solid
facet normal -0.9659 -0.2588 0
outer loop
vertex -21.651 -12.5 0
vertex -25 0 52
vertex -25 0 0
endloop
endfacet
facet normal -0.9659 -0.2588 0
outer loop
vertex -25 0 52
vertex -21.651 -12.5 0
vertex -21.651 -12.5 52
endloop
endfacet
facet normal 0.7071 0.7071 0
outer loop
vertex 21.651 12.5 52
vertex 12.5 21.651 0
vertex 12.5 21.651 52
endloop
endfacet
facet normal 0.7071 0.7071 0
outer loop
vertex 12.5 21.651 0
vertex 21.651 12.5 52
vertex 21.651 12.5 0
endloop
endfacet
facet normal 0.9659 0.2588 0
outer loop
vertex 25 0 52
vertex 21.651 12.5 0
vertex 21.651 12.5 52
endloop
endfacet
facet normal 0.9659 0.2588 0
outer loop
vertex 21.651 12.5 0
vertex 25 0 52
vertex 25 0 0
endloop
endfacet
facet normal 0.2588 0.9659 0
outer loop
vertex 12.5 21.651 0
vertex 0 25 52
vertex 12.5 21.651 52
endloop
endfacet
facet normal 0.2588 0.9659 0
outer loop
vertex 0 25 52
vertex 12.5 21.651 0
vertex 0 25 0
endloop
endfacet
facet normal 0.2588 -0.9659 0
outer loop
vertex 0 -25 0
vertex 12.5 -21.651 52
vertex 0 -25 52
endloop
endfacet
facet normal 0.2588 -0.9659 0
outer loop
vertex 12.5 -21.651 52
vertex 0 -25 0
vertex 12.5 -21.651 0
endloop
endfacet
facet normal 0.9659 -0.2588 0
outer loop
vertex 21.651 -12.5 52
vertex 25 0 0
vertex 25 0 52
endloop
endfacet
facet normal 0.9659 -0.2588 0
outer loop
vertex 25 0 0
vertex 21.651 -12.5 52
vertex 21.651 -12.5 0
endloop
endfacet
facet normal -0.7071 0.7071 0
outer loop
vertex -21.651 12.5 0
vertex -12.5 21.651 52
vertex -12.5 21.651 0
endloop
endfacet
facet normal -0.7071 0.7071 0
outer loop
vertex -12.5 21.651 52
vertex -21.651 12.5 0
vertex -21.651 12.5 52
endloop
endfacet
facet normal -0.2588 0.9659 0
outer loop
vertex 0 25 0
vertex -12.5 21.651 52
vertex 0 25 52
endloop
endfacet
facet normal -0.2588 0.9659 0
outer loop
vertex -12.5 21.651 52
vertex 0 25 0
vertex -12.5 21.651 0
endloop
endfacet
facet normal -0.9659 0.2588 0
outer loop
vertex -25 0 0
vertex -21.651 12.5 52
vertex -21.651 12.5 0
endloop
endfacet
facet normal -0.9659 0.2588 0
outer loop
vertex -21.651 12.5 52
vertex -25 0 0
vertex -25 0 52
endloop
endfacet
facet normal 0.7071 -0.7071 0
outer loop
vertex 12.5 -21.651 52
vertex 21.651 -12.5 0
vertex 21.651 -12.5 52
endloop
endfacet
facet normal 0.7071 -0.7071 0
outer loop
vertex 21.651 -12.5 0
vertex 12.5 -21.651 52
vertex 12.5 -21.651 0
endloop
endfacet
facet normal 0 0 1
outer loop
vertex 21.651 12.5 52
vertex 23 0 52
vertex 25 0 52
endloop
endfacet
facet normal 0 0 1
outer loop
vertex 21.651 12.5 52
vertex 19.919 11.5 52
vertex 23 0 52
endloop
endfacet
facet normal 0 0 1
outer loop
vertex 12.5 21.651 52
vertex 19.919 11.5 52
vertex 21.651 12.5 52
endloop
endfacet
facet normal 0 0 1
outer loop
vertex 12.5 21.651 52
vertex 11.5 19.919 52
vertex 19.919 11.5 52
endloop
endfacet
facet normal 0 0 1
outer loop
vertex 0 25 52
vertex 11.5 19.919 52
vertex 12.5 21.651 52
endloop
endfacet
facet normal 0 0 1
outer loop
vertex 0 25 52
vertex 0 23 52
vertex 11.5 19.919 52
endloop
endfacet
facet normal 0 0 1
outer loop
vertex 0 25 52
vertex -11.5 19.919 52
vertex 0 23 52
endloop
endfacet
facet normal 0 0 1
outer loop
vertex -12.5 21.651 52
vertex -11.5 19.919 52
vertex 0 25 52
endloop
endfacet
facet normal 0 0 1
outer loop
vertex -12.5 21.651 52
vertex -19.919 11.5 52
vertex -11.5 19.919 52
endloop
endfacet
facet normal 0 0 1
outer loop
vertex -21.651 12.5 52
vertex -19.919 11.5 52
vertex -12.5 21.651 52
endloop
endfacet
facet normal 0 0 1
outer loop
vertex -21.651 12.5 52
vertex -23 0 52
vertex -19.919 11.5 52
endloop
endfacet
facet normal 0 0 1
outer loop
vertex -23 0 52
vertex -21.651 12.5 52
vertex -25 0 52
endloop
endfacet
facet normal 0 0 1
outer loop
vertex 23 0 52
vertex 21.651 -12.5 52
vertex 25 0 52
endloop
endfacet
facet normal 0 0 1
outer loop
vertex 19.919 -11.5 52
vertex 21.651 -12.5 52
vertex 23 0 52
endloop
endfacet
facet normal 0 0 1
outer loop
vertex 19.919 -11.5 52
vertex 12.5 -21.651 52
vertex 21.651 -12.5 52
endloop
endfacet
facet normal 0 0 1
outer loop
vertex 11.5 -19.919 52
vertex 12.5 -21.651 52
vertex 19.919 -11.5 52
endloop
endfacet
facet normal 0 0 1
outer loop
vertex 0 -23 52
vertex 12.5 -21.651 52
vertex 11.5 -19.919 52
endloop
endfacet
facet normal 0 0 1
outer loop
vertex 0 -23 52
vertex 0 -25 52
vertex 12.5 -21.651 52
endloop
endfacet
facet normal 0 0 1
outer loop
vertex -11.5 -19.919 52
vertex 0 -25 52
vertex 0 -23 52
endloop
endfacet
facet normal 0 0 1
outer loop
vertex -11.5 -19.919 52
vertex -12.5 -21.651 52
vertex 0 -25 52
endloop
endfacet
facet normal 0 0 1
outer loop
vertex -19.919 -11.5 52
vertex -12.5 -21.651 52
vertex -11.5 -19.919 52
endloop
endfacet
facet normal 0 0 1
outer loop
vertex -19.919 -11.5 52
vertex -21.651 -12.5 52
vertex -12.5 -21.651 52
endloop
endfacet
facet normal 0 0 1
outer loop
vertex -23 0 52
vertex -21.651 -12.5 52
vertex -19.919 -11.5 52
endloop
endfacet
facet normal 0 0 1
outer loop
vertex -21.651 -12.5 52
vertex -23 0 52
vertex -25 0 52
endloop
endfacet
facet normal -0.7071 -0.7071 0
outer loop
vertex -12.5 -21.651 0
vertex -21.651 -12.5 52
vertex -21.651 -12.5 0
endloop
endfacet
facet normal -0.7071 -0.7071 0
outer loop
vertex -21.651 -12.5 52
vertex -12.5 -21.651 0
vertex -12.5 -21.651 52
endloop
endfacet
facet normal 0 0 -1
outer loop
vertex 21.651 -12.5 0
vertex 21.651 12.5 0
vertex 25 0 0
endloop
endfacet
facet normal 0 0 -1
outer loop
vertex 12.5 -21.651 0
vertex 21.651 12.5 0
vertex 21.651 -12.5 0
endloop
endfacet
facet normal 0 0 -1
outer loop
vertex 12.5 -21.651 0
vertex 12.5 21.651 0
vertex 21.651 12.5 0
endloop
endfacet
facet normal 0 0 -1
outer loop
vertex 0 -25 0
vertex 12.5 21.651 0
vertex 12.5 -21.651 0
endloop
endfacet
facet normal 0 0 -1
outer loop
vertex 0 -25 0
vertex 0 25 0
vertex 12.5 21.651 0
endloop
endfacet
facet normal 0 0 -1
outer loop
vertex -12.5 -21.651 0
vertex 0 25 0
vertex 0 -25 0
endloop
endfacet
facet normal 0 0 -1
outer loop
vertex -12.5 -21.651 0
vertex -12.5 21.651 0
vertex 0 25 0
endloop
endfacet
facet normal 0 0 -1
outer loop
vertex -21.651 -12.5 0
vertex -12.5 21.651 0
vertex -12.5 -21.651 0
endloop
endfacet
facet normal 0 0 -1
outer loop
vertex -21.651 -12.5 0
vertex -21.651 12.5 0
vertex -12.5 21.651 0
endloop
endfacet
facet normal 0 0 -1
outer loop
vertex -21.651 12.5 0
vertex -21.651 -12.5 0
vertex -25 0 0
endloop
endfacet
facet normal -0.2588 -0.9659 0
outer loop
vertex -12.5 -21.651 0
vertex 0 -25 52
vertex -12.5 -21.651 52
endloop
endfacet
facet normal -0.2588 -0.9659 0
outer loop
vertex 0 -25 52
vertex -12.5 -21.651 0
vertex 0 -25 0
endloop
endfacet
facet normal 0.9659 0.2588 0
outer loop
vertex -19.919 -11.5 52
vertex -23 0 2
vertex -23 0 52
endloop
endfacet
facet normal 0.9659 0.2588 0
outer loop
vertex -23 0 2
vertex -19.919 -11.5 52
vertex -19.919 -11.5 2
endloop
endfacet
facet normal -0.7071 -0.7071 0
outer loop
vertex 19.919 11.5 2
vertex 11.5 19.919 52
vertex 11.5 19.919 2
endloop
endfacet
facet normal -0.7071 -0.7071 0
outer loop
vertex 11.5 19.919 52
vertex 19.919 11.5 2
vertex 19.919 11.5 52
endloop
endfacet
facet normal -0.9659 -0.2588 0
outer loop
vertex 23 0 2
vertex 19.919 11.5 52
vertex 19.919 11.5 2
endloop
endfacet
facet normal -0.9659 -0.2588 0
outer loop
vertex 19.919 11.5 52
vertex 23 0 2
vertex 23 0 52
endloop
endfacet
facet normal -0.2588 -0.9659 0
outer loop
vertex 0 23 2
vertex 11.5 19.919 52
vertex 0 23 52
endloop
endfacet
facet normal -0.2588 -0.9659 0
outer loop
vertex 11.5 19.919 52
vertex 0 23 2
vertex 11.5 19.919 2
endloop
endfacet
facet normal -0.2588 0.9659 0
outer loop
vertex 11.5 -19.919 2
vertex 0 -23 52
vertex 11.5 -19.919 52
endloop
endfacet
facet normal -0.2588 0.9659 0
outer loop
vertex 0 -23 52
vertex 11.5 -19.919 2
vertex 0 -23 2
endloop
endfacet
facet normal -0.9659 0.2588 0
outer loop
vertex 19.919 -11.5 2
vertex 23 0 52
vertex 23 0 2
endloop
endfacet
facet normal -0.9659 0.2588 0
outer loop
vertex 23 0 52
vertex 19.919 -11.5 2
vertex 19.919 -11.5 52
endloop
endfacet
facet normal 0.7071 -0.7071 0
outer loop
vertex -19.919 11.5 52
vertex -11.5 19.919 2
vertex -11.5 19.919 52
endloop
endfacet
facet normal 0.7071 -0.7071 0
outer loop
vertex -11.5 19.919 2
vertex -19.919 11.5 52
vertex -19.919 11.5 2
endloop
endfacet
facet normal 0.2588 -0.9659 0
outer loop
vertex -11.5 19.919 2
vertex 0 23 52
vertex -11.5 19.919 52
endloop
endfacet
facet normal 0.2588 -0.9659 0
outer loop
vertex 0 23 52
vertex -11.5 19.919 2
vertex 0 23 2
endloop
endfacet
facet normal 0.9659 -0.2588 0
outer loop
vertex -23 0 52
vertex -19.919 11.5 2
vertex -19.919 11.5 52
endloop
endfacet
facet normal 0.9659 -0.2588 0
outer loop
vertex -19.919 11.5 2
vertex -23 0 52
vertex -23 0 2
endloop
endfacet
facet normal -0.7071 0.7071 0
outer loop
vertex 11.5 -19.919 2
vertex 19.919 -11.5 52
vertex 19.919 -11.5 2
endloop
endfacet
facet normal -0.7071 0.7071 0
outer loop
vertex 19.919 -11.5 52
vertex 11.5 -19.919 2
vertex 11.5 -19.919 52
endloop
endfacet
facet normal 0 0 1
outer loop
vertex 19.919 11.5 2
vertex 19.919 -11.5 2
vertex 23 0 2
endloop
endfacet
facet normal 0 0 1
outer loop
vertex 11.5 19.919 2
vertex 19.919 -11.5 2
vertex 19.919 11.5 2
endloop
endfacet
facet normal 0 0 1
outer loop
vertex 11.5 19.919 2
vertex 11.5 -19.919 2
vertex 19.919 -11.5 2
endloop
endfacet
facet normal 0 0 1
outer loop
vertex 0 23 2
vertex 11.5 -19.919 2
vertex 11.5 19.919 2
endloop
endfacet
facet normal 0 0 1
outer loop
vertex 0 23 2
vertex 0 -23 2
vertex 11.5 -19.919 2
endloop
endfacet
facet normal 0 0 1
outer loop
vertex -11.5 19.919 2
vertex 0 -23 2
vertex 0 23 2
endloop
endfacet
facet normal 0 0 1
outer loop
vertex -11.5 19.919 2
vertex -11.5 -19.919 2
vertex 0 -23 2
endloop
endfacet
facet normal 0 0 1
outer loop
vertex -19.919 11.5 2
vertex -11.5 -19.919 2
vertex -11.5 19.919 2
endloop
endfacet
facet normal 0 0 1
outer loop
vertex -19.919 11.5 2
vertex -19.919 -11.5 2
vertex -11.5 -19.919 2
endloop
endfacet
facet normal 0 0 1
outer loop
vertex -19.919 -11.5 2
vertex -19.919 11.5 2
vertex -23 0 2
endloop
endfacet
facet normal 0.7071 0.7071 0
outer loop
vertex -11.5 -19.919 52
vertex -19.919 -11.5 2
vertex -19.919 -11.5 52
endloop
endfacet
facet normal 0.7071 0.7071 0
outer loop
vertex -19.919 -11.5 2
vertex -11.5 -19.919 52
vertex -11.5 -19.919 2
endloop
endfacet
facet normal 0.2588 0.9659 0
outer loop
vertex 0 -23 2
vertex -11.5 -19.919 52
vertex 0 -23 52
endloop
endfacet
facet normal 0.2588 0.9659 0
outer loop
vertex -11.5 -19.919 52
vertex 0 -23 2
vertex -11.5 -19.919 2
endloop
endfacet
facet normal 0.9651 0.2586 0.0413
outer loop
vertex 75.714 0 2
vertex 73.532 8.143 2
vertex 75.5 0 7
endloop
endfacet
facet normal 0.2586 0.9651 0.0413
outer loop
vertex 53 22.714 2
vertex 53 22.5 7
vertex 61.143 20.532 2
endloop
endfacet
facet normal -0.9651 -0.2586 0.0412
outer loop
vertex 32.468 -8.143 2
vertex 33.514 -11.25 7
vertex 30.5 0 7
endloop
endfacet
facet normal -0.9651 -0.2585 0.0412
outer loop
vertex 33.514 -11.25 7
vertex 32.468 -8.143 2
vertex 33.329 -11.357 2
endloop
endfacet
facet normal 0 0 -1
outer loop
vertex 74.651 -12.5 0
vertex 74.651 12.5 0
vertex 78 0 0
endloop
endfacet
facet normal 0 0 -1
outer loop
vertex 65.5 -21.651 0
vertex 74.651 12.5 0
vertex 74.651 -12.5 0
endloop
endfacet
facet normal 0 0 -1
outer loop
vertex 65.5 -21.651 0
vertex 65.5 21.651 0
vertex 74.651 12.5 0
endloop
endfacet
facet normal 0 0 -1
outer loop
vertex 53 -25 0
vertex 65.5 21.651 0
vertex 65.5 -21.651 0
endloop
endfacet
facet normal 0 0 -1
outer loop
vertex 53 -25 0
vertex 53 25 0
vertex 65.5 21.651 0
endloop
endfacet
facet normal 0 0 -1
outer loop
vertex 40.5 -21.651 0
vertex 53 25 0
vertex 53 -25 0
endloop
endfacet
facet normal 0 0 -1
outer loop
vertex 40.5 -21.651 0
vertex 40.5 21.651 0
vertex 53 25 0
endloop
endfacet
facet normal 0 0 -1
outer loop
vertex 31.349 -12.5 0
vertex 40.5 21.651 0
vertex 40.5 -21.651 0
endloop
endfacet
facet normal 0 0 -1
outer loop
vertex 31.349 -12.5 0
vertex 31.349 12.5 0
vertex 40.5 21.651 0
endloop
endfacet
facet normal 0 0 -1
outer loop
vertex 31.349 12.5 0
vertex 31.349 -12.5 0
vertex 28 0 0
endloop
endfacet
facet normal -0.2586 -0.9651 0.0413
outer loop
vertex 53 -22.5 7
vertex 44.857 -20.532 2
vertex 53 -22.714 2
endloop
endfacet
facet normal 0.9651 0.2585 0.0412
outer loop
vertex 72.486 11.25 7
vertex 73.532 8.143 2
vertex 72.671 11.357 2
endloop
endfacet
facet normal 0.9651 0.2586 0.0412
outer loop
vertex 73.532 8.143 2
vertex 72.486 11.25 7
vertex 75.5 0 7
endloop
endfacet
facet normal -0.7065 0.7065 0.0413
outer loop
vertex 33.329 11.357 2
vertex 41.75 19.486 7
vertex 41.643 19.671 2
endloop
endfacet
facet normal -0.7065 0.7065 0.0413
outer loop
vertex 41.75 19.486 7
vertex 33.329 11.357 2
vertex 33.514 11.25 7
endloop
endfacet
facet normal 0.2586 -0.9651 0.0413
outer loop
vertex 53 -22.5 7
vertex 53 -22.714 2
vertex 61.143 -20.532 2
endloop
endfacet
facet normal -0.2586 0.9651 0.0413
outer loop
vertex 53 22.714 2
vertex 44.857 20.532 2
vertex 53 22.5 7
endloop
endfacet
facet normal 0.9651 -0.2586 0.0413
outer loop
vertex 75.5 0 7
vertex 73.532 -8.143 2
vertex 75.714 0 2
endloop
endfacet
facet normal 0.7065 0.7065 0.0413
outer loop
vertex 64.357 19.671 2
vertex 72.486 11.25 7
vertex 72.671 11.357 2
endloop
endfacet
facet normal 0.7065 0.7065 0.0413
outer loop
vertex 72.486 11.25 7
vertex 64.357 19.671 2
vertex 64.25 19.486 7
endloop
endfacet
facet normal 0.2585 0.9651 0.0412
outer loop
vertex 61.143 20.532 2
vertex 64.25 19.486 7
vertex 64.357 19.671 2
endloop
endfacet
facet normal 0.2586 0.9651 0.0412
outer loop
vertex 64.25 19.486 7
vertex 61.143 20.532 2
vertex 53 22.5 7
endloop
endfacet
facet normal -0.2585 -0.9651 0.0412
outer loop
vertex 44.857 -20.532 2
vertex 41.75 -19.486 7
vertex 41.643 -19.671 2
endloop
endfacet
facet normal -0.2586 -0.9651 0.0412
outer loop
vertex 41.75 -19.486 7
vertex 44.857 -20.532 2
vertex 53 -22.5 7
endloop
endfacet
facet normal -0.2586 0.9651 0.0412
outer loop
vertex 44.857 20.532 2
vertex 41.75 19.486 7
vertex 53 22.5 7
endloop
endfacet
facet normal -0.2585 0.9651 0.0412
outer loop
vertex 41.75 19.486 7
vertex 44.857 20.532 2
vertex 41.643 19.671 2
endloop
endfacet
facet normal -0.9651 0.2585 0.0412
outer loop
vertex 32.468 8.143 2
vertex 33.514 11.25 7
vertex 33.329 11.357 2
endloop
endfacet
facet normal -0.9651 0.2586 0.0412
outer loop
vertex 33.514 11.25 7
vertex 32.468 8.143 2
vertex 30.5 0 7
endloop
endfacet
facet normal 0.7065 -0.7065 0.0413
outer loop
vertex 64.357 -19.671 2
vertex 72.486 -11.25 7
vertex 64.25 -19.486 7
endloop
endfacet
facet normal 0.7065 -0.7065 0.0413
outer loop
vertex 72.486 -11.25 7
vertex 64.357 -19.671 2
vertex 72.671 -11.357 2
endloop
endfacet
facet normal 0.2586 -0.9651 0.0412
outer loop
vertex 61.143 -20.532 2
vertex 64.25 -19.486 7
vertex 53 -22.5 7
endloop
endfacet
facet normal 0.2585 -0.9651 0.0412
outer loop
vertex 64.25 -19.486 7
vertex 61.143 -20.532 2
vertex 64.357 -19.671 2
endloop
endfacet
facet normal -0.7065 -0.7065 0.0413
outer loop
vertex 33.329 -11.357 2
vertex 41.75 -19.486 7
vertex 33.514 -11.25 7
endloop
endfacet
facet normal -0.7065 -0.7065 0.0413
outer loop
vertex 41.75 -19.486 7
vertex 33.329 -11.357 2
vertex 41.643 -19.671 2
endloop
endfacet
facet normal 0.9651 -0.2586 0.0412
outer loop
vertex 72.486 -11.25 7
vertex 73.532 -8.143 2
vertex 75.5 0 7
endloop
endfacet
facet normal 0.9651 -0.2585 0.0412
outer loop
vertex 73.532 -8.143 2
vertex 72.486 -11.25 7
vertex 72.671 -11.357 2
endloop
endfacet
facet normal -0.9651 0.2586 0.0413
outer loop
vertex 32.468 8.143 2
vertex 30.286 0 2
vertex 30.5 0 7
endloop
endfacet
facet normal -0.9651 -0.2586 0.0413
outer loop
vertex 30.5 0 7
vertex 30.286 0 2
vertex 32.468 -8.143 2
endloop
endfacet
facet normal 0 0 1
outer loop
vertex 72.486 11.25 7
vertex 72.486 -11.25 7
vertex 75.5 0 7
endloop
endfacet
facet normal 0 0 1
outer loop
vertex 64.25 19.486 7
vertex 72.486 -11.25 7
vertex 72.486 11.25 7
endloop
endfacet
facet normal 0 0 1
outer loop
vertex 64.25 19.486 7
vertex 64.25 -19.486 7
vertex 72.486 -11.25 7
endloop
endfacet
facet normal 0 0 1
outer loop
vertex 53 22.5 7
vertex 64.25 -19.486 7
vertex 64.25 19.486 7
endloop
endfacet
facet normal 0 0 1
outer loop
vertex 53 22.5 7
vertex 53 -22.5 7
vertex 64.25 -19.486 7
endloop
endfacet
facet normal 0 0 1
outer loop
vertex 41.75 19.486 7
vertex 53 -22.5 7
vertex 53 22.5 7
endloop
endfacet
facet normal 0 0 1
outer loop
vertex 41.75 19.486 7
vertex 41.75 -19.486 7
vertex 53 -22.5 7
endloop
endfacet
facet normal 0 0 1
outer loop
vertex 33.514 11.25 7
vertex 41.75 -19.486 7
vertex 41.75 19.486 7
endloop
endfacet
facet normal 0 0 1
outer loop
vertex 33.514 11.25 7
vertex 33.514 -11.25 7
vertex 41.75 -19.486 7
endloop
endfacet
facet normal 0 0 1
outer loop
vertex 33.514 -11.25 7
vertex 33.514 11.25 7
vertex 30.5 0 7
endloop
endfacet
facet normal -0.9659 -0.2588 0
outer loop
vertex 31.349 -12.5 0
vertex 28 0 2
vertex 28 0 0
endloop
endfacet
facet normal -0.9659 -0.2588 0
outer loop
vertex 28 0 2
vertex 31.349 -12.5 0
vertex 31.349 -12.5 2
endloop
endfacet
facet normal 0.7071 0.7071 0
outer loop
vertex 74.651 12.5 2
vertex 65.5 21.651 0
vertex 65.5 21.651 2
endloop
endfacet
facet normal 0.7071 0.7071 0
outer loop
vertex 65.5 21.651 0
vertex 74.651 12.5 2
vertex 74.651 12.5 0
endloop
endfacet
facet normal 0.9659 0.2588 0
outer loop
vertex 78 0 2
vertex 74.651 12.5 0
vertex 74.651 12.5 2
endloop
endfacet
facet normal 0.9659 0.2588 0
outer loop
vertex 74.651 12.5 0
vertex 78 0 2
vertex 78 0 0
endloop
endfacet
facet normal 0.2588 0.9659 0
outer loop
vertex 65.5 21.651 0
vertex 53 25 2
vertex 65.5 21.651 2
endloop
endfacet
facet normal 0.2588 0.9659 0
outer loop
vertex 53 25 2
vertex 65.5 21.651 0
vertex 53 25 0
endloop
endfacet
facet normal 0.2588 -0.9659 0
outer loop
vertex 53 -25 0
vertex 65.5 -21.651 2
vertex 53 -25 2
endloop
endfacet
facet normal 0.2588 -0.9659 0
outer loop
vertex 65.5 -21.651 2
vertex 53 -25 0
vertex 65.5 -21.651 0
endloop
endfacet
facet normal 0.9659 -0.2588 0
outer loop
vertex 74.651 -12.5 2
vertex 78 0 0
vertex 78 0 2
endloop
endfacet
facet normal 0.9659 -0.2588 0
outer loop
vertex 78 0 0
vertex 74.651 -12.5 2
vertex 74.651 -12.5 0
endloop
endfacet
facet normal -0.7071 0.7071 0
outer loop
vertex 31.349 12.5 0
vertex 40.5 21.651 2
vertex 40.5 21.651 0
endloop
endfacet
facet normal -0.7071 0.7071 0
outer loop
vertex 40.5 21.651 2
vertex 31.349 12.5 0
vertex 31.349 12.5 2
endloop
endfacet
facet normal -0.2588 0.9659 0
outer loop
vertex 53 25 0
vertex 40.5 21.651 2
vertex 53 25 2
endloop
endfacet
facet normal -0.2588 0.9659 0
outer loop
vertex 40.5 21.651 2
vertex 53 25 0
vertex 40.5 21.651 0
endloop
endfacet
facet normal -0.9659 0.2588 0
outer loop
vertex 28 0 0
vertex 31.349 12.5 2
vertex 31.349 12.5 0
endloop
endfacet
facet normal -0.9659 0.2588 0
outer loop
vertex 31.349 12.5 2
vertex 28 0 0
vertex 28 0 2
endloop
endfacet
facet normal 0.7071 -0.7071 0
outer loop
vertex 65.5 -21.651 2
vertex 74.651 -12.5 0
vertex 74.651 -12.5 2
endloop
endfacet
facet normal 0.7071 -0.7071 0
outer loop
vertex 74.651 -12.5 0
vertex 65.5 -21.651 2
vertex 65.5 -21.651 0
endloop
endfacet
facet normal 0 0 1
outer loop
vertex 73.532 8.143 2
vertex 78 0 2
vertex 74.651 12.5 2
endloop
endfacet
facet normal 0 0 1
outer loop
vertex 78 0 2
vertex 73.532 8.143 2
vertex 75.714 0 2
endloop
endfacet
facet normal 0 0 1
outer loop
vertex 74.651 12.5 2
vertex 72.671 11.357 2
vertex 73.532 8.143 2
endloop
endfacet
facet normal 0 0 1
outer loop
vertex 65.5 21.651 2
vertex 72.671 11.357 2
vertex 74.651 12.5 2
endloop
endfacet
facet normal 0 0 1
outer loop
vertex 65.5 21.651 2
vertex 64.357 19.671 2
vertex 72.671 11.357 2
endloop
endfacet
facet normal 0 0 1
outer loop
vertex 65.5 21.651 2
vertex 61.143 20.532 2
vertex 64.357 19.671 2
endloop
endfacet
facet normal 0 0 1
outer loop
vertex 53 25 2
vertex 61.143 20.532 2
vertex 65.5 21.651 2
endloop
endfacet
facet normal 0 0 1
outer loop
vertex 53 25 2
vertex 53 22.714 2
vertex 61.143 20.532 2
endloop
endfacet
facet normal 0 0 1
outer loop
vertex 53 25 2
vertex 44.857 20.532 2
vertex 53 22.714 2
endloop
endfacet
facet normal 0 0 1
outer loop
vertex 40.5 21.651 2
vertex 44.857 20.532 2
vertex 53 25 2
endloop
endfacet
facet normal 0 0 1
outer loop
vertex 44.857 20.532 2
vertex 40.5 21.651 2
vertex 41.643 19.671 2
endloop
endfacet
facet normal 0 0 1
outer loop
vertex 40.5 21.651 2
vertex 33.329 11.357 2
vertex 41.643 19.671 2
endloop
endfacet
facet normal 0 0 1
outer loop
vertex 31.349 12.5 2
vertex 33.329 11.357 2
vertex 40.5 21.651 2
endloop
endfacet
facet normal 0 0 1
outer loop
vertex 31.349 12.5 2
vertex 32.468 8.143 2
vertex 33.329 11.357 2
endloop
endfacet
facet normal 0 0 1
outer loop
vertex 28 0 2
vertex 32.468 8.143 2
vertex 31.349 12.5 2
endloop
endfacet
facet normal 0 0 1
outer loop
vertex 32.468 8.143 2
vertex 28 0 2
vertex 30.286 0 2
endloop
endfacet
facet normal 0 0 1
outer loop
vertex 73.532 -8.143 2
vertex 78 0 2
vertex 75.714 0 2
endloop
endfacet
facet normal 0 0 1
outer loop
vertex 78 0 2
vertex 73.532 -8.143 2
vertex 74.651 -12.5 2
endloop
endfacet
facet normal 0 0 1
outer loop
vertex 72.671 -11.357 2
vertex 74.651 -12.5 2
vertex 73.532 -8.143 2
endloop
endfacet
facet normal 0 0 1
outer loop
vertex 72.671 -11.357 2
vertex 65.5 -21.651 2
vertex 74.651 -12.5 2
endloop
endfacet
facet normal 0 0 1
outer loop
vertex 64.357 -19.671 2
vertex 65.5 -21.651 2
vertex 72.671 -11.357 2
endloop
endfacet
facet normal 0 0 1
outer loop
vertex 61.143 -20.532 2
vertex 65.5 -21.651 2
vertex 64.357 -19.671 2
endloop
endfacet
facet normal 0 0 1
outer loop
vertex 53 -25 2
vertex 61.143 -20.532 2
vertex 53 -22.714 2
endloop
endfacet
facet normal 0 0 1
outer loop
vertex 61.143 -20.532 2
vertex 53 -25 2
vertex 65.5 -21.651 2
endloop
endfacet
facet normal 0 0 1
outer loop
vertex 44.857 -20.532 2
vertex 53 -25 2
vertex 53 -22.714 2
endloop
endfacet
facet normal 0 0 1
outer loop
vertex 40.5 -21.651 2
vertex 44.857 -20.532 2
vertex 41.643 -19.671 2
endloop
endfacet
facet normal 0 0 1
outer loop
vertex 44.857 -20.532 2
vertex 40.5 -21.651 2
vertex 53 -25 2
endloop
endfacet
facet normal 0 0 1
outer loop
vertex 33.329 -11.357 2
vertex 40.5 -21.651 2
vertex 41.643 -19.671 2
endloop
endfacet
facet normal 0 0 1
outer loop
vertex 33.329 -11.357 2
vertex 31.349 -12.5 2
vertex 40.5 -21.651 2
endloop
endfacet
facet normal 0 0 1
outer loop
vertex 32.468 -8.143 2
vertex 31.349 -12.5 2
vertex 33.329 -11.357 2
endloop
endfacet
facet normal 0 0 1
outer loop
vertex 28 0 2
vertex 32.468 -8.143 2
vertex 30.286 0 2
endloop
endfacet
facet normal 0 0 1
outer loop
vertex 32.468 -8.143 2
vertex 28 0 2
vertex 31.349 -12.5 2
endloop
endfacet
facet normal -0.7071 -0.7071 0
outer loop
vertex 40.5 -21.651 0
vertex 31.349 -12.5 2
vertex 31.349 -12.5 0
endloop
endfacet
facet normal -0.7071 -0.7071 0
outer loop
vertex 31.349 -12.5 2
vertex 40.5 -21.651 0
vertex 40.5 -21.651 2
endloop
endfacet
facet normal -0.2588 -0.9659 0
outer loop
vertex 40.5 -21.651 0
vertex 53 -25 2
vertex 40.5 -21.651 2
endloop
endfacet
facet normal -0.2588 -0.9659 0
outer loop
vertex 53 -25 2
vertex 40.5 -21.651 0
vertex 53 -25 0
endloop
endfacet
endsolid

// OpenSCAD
outer_radius = 25;
wall_thickness = 2.0;
height = 50;
sides = 12;
hole_radius = 3;
lip = 5;

difference(){
  union(){
    cylinder(r=outer_radius, height+wall_thickness, $fn=sides);
    cylinder(r=outer_radius, wall_thickness, $fn=sides);
  }
  translate(v=[0,0,wall_thickness]){
    cylinder(r=outer_radius-wall_thickness, h=height+wall_thickness, $fn=sides);
  }
  // holes
  for (x=sin([0:sides]), y=cos([0:sides]), z=[10, 20, 30, 40]){
    rotate([x, y, 0])
      translate([x*outer_radius, y*outer_radius*2, z])
        cylinder(r=hole_radius, h=wall_thickness+1);
  }
}

  // holes
  theta = [0:360/sides:(sides-1)*360];
  for (x=sin(theta), y=cos(theta), z=[10, 20, 30, 40]){
    rotate([x, y, 0])
      translate([x*outer_radius, y*outer_radius*2, z])
        cylinder(r=hole_radius, h=wall_thickness+1);
  }

translate(v=[outer_radius*2+3,0,0]){
  union(){
    cylinder(r1=outer_radius-wall_thickness-0.2, r2=outer_radius-wall_thickness-0.5, wall_thickness+lip, $fn=sides);
    cylinder(r=outer_radius, wall_thickness, $fn=sides);
  }
}
